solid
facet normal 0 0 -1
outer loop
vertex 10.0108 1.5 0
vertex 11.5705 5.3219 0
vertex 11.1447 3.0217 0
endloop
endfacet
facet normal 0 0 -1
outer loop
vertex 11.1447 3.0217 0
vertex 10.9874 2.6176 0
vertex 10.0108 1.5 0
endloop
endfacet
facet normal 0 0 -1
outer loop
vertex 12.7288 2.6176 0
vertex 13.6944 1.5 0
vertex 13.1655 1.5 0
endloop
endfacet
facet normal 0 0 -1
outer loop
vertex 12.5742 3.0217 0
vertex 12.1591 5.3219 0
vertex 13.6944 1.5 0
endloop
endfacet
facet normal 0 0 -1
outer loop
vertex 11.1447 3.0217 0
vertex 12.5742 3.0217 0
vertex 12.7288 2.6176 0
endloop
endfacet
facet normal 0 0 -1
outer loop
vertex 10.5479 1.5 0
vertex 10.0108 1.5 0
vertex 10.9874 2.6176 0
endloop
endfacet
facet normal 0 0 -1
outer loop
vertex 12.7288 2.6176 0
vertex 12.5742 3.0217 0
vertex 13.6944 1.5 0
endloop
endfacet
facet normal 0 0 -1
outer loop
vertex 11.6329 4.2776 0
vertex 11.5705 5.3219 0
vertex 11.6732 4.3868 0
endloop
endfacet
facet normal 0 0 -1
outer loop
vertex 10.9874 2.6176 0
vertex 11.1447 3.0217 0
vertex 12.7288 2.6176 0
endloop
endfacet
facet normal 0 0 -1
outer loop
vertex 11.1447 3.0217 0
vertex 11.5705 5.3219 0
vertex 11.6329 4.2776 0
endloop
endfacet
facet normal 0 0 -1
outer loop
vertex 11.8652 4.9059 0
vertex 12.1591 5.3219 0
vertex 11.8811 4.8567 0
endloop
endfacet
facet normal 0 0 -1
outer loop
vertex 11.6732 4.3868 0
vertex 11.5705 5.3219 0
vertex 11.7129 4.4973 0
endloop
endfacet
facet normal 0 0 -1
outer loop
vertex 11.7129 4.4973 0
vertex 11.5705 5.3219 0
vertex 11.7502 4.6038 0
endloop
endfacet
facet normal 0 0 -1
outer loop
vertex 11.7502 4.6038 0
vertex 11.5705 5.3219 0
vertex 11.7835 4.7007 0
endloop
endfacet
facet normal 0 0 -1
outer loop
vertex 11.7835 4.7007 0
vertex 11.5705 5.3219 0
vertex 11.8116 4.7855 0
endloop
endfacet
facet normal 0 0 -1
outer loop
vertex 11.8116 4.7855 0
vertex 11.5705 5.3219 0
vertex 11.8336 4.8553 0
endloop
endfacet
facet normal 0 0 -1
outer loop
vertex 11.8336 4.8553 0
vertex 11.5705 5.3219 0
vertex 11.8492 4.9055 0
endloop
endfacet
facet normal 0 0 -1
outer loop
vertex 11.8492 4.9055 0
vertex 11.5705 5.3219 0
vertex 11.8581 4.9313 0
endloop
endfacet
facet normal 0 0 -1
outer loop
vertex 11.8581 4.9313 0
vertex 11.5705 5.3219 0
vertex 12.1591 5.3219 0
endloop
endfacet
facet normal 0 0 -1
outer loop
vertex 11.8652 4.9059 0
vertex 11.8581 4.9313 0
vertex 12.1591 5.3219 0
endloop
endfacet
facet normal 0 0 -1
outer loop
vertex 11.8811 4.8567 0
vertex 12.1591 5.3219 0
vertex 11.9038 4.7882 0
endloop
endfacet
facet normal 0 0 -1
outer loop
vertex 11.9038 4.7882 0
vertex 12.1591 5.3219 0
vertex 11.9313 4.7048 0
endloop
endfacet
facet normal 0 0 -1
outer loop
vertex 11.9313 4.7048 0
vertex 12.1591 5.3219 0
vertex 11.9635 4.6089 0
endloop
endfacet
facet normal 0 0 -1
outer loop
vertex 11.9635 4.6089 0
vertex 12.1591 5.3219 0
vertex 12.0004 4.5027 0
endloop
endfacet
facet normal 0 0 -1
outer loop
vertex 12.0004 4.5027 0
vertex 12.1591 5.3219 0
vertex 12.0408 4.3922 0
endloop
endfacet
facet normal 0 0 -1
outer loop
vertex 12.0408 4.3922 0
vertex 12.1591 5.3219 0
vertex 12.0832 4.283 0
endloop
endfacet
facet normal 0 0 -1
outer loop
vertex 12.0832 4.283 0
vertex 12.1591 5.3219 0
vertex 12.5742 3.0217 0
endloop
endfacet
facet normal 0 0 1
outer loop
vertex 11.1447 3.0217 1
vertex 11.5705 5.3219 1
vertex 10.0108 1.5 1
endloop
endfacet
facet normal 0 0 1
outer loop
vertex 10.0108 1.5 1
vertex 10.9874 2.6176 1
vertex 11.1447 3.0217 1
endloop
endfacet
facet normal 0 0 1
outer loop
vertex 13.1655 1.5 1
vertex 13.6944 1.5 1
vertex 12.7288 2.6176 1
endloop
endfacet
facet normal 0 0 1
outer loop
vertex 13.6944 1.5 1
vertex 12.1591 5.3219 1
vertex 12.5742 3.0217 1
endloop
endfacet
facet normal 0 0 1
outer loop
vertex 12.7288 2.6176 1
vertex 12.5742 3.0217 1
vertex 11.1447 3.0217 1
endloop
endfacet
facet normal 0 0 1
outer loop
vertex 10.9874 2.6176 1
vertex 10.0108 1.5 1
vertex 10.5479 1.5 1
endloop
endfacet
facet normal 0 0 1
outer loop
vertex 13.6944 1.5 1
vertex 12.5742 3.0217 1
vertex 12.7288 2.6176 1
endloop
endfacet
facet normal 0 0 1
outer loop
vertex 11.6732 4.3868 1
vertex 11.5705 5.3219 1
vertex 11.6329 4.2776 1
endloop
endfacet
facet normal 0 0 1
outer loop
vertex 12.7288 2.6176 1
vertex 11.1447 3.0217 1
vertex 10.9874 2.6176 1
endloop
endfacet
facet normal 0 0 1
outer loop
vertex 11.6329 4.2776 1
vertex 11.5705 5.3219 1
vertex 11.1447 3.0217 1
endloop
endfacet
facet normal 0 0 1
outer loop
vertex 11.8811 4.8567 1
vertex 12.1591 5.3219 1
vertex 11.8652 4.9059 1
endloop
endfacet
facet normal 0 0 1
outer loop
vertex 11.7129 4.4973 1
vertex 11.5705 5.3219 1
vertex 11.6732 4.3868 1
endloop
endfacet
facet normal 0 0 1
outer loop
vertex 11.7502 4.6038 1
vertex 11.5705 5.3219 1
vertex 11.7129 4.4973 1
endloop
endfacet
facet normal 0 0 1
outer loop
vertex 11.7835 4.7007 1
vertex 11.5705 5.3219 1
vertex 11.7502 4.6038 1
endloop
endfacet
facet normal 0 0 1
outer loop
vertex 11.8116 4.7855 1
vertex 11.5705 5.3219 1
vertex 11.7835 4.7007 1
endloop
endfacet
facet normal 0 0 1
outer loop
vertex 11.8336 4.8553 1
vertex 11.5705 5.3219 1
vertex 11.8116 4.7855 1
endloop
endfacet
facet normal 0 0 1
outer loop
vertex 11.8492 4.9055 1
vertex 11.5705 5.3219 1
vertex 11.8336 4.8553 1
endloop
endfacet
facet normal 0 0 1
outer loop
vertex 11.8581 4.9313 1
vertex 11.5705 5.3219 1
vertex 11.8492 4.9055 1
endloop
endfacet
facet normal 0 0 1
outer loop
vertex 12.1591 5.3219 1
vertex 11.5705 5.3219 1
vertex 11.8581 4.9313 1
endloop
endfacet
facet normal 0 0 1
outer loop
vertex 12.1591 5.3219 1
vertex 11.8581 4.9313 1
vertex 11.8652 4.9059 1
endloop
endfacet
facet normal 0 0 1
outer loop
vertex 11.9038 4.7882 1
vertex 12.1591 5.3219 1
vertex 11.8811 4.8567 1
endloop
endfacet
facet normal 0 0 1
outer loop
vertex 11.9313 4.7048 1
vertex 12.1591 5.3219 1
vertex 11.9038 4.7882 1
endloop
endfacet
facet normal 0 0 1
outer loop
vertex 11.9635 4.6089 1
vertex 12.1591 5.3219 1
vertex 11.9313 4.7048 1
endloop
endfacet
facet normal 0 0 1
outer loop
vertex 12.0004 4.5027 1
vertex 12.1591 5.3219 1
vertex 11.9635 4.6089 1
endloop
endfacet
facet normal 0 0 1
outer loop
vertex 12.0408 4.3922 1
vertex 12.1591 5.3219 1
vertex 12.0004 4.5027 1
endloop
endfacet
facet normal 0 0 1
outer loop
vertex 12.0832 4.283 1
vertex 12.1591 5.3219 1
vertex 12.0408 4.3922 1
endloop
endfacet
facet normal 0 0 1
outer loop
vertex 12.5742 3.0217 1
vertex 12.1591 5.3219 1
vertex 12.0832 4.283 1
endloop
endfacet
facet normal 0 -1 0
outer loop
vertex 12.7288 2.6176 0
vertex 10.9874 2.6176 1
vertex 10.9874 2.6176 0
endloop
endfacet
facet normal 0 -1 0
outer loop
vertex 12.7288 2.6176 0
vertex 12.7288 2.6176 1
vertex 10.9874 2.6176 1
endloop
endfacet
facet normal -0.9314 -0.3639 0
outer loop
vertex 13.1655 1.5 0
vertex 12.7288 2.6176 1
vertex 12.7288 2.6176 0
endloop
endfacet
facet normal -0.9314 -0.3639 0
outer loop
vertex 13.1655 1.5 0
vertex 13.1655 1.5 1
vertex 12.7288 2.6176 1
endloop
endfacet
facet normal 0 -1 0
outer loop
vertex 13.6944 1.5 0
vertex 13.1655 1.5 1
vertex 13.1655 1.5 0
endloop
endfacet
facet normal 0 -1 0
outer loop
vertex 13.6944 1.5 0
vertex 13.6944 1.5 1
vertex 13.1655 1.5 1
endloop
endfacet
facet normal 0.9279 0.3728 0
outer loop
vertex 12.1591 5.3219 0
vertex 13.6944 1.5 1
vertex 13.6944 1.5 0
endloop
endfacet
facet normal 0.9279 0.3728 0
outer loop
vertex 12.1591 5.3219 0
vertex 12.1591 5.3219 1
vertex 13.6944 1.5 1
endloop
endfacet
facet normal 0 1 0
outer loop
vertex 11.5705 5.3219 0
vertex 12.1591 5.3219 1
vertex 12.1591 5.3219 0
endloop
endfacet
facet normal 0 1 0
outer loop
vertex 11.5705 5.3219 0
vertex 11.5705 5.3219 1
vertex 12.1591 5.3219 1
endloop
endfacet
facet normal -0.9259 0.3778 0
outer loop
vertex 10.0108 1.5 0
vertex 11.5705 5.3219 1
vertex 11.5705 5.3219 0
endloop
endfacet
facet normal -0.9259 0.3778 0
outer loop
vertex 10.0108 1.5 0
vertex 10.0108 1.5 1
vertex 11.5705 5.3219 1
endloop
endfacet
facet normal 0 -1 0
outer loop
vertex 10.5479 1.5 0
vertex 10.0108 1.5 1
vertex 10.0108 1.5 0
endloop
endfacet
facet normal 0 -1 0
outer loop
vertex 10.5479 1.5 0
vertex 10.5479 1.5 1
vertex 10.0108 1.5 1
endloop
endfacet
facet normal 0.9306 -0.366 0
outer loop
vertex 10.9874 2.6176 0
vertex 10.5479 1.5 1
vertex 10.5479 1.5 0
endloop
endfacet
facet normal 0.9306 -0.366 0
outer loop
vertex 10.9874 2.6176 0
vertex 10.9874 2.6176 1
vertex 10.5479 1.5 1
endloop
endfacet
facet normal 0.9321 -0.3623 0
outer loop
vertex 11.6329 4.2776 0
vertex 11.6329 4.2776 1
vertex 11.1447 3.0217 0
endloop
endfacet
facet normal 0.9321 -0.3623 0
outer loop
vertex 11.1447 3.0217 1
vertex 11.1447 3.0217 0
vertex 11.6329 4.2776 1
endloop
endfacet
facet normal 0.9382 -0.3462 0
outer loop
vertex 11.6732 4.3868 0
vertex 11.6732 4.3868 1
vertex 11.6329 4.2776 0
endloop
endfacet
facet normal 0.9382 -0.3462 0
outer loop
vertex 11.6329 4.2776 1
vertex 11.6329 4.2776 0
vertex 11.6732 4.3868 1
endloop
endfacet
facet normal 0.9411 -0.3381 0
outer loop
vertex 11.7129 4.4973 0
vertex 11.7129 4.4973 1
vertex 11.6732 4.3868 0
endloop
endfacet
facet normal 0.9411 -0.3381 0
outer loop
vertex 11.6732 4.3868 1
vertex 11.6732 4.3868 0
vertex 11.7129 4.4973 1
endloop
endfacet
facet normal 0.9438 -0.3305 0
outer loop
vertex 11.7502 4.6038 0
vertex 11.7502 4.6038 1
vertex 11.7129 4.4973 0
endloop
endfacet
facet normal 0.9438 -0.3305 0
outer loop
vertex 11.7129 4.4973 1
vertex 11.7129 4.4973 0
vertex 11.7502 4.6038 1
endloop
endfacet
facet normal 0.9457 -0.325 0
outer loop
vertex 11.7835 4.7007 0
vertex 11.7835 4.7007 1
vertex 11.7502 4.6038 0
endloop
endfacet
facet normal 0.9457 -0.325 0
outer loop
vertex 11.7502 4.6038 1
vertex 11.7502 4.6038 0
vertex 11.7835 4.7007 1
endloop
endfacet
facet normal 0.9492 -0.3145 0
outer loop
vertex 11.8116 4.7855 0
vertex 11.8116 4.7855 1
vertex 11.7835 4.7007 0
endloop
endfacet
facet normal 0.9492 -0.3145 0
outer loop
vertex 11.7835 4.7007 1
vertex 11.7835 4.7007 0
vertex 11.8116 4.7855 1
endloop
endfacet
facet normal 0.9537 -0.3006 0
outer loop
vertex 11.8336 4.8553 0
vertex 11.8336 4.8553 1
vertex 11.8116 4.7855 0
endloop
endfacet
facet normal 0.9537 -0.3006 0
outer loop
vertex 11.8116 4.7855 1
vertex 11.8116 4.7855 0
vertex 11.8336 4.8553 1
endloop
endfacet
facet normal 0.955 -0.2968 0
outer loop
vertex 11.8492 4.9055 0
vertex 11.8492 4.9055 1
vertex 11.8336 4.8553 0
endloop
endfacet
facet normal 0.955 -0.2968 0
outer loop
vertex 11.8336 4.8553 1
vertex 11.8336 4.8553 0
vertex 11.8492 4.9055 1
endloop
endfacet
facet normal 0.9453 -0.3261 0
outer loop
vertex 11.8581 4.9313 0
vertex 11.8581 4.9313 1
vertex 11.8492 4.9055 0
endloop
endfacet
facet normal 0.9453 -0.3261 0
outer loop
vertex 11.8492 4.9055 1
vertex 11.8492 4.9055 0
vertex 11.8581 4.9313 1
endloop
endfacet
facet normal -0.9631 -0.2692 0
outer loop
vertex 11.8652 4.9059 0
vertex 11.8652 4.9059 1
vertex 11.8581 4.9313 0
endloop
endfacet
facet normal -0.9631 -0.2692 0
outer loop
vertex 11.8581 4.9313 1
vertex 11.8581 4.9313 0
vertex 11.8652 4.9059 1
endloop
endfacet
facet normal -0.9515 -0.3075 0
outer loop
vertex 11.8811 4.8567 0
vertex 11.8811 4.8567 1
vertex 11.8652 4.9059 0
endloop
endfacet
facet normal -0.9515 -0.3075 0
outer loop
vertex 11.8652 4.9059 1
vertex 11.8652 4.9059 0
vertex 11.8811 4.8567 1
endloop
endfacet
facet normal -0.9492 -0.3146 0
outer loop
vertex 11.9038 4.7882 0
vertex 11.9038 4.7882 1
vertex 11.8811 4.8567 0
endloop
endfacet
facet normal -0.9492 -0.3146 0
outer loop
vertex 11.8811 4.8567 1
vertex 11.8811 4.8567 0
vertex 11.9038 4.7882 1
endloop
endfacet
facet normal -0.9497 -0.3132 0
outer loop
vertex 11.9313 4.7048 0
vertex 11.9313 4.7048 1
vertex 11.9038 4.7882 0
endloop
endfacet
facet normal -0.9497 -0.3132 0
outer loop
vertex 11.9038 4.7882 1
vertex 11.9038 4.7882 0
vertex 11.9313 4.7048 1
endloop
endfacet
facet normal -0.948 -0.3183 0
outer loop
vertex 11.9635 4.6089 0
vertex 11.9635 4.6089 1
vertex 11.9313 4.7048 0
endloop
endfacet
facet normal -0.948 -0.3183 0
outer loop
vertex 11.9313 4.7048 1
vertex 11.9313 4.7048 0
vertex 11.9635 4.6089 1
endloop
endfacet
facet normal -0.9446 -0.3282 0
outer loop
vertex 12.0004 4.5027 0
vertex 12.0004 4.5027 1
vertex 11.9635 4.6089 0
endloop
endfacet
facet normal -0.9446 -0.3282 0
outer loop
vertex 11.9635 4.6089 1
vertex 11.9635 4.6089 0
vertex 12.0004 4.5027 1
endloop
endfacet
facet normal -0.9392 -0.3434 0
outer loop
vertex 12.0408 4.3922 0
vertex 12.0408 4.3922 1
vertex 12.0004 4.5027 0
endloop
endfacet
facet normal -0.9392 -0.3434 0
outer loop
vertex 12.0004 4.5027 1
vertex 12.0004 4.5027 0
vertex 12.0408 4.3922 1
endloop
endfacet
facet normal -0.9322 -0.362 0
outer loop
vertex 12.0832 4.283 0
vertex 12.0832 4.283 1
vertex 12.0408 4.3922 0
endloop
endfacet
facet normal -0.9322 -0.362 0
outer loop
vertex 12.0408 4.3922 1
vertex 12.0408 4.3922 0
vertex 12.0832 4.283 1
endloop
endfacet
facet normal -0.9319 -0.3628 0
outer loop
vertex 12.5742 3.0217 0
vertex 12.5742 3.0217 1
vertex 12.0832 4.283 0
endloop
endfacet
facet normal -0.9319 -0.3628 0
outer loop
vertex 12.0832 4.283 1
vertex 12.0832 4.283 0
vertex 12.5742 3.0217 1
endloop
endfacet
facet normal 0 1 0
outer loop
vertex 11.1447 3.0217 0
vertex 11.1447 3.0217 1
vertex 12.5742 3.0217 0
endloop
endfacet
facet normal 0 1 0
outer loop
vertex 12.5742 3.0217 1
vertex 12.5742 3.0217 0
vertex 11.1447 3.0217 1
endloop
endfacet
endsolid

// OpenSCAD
/*
scale([0.1,0.1,0.005])    
surface(file="keypad.png", invert=true);

translate([36,30,0])
color([0,0,1])
linear_extrude(height=1)
text("5", font="Arial", size=3.7);
*/

//scale([0.1,0.1,0.005])    
//surface(file="letter_A.png", invert=true);

translate([10,1.5,0])
color([0,0,1])
linear_extrude(height=1)
text("A", font="Arial", size=4);
